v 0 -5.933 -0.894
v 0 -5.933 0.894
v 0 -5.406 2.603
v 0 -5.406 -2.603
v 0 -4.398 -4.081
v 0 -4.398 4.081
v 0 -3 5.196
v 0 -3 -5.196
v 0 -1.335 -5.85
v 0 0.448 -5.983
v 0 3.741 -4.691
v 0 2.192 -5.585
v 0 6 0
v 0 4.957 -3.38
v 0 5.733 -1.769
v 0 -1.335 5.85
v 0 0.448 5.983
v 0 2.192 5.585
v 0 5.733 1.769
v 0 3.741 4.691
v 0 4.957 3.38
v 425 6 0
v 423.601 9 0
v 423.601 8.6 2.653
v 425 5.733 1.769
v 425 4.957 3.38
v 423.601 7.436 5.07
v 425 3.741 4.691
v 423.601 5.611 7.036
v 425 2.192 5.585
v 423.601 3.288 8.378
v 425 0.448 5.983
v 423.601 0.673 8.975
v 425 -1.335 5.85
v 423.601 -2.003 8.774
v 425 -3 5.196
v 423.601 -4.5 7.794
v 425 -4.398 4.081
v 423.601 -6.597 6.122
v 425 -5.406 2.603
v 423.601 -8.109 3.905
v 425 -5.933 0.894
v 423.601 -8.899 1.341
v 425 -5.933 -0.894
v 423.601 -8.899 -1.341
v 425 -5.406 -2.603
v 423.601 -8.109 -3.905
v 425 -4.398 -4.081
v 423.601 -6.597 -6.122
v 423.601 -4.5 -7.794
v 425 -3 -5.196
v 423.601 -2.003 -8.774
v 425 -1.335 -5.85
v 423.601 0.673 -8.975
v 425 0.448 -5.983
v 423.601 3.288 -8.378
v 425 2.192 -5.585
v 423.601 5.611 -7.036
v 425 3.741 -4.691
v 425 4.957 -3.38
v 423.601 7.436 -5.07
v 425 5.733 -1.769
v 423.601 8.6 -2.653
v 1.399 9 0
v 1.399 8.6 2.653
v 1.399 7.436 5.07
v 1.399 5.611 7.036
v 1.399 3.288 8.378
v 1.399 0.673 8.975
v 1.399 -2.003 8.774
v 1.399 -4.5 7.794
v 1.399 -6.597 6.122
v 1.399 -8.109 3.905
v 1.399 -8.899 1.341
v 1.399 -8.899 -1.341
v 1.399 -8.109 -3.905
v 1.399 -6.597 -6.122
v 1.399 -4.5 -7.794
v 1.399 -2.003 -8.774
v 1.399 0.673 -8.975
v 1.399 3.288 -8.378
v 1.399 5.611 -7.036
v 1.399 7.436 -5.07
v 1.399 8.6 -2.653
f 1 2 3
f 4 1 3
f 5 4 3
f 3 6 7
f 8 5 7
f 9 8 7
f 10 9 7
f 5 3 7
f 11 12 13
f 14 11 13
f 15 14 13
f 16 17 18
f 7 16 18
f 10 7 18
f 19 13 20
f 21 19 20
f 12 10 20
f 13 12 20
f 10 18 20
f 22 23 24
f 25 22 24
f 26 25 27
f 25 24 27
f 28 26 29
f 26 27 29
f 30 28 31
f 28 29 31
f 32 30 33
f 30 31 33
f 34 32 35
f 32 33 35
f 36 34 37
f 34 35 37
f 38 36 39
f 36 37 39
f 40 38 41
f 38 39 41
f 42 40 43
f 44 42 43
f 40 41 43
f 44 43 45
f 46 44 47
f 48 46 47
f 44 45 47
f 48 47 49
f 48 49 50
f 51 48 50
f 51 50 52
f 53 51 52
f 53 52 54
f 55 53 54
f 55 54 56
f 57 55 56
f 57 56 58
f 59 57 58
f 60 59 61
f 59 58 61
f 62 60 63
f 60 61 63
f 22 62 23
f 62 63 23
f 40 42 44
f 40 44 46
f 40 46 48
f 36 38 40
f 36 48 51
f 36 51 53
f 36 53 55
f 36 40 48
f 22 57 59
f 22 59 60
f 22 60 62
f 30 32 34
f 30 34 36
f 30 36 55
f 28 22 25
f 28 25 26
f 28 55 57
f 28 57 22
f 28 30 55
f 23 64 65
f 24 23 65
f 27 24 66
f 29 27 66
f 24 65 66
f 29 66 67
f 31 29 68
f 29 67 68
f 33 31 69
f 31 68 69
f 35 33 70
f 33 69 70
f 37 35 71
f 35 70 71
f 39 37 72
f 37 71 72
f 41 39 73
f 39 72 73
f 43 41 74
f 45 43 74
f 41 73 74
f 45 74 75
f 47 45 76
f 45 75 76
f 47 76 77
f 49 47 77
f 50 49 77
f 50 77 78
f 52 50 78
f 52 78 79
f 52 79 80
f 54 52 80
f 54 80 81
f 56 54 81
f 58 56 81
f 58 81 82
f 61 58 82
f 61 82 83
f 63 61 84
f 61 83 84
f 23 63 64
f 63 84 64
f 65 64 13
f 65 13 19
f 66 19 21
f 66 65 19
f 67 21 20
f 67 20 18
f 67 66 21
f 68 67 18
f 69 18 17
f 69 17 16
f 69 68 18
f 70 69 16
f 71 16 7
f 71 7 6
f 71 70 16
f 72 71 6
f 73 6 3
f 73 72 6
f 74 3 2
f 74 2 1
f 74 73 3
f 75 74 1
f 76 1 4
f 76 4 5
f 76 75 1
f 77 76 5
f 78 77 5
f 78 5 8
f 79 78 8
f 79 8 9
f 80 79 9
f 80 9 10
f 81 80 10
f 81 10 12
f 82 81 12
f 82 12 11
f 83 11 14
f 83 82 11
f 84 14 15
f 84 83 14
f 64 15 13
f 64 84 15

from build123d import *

# Parameters (mm, degrees)
F0_R       = 9
F1_DEPTH   = 425
F2_SIZE2   = 1.3989229745
F2_SIZE    = 3
F2_2_SIZE2 = 1.3989229745
F2_2_SIZE  = 3


with BuildPart() as f1:
    # F0 (on Right) → F1 (new body)
    with BuildSketch(Plane.YZ):
        Circle(F0_R)
    extrude(amount=F1_DEPTH)

    # F2
    f2_edges = [f1.edges().sort_by_distance(p)[0] for p in [
        (425, -9, 0),
    ]]
    f2_side = f1.faces().sort_by_distance((425, 0, 0))[0]
    chamfer(f2_edges, length=F2_SIZE, length2=F2_SIZE2, reference=f2_side)

    # F2#2
    f2_2_edges = [f1.edges().sort_by_distance(p)[0] for p in [
        (0, -9, 0),
    ]]
    f2_2_side = f1.faces().sort_by_distance((0, 0, 0))[0]
    chamfer(f2_2_edges, length=F2_2_SIZE, length2=F2_2_SIZE2, reference=f2_2_side)


solid = f1.part
